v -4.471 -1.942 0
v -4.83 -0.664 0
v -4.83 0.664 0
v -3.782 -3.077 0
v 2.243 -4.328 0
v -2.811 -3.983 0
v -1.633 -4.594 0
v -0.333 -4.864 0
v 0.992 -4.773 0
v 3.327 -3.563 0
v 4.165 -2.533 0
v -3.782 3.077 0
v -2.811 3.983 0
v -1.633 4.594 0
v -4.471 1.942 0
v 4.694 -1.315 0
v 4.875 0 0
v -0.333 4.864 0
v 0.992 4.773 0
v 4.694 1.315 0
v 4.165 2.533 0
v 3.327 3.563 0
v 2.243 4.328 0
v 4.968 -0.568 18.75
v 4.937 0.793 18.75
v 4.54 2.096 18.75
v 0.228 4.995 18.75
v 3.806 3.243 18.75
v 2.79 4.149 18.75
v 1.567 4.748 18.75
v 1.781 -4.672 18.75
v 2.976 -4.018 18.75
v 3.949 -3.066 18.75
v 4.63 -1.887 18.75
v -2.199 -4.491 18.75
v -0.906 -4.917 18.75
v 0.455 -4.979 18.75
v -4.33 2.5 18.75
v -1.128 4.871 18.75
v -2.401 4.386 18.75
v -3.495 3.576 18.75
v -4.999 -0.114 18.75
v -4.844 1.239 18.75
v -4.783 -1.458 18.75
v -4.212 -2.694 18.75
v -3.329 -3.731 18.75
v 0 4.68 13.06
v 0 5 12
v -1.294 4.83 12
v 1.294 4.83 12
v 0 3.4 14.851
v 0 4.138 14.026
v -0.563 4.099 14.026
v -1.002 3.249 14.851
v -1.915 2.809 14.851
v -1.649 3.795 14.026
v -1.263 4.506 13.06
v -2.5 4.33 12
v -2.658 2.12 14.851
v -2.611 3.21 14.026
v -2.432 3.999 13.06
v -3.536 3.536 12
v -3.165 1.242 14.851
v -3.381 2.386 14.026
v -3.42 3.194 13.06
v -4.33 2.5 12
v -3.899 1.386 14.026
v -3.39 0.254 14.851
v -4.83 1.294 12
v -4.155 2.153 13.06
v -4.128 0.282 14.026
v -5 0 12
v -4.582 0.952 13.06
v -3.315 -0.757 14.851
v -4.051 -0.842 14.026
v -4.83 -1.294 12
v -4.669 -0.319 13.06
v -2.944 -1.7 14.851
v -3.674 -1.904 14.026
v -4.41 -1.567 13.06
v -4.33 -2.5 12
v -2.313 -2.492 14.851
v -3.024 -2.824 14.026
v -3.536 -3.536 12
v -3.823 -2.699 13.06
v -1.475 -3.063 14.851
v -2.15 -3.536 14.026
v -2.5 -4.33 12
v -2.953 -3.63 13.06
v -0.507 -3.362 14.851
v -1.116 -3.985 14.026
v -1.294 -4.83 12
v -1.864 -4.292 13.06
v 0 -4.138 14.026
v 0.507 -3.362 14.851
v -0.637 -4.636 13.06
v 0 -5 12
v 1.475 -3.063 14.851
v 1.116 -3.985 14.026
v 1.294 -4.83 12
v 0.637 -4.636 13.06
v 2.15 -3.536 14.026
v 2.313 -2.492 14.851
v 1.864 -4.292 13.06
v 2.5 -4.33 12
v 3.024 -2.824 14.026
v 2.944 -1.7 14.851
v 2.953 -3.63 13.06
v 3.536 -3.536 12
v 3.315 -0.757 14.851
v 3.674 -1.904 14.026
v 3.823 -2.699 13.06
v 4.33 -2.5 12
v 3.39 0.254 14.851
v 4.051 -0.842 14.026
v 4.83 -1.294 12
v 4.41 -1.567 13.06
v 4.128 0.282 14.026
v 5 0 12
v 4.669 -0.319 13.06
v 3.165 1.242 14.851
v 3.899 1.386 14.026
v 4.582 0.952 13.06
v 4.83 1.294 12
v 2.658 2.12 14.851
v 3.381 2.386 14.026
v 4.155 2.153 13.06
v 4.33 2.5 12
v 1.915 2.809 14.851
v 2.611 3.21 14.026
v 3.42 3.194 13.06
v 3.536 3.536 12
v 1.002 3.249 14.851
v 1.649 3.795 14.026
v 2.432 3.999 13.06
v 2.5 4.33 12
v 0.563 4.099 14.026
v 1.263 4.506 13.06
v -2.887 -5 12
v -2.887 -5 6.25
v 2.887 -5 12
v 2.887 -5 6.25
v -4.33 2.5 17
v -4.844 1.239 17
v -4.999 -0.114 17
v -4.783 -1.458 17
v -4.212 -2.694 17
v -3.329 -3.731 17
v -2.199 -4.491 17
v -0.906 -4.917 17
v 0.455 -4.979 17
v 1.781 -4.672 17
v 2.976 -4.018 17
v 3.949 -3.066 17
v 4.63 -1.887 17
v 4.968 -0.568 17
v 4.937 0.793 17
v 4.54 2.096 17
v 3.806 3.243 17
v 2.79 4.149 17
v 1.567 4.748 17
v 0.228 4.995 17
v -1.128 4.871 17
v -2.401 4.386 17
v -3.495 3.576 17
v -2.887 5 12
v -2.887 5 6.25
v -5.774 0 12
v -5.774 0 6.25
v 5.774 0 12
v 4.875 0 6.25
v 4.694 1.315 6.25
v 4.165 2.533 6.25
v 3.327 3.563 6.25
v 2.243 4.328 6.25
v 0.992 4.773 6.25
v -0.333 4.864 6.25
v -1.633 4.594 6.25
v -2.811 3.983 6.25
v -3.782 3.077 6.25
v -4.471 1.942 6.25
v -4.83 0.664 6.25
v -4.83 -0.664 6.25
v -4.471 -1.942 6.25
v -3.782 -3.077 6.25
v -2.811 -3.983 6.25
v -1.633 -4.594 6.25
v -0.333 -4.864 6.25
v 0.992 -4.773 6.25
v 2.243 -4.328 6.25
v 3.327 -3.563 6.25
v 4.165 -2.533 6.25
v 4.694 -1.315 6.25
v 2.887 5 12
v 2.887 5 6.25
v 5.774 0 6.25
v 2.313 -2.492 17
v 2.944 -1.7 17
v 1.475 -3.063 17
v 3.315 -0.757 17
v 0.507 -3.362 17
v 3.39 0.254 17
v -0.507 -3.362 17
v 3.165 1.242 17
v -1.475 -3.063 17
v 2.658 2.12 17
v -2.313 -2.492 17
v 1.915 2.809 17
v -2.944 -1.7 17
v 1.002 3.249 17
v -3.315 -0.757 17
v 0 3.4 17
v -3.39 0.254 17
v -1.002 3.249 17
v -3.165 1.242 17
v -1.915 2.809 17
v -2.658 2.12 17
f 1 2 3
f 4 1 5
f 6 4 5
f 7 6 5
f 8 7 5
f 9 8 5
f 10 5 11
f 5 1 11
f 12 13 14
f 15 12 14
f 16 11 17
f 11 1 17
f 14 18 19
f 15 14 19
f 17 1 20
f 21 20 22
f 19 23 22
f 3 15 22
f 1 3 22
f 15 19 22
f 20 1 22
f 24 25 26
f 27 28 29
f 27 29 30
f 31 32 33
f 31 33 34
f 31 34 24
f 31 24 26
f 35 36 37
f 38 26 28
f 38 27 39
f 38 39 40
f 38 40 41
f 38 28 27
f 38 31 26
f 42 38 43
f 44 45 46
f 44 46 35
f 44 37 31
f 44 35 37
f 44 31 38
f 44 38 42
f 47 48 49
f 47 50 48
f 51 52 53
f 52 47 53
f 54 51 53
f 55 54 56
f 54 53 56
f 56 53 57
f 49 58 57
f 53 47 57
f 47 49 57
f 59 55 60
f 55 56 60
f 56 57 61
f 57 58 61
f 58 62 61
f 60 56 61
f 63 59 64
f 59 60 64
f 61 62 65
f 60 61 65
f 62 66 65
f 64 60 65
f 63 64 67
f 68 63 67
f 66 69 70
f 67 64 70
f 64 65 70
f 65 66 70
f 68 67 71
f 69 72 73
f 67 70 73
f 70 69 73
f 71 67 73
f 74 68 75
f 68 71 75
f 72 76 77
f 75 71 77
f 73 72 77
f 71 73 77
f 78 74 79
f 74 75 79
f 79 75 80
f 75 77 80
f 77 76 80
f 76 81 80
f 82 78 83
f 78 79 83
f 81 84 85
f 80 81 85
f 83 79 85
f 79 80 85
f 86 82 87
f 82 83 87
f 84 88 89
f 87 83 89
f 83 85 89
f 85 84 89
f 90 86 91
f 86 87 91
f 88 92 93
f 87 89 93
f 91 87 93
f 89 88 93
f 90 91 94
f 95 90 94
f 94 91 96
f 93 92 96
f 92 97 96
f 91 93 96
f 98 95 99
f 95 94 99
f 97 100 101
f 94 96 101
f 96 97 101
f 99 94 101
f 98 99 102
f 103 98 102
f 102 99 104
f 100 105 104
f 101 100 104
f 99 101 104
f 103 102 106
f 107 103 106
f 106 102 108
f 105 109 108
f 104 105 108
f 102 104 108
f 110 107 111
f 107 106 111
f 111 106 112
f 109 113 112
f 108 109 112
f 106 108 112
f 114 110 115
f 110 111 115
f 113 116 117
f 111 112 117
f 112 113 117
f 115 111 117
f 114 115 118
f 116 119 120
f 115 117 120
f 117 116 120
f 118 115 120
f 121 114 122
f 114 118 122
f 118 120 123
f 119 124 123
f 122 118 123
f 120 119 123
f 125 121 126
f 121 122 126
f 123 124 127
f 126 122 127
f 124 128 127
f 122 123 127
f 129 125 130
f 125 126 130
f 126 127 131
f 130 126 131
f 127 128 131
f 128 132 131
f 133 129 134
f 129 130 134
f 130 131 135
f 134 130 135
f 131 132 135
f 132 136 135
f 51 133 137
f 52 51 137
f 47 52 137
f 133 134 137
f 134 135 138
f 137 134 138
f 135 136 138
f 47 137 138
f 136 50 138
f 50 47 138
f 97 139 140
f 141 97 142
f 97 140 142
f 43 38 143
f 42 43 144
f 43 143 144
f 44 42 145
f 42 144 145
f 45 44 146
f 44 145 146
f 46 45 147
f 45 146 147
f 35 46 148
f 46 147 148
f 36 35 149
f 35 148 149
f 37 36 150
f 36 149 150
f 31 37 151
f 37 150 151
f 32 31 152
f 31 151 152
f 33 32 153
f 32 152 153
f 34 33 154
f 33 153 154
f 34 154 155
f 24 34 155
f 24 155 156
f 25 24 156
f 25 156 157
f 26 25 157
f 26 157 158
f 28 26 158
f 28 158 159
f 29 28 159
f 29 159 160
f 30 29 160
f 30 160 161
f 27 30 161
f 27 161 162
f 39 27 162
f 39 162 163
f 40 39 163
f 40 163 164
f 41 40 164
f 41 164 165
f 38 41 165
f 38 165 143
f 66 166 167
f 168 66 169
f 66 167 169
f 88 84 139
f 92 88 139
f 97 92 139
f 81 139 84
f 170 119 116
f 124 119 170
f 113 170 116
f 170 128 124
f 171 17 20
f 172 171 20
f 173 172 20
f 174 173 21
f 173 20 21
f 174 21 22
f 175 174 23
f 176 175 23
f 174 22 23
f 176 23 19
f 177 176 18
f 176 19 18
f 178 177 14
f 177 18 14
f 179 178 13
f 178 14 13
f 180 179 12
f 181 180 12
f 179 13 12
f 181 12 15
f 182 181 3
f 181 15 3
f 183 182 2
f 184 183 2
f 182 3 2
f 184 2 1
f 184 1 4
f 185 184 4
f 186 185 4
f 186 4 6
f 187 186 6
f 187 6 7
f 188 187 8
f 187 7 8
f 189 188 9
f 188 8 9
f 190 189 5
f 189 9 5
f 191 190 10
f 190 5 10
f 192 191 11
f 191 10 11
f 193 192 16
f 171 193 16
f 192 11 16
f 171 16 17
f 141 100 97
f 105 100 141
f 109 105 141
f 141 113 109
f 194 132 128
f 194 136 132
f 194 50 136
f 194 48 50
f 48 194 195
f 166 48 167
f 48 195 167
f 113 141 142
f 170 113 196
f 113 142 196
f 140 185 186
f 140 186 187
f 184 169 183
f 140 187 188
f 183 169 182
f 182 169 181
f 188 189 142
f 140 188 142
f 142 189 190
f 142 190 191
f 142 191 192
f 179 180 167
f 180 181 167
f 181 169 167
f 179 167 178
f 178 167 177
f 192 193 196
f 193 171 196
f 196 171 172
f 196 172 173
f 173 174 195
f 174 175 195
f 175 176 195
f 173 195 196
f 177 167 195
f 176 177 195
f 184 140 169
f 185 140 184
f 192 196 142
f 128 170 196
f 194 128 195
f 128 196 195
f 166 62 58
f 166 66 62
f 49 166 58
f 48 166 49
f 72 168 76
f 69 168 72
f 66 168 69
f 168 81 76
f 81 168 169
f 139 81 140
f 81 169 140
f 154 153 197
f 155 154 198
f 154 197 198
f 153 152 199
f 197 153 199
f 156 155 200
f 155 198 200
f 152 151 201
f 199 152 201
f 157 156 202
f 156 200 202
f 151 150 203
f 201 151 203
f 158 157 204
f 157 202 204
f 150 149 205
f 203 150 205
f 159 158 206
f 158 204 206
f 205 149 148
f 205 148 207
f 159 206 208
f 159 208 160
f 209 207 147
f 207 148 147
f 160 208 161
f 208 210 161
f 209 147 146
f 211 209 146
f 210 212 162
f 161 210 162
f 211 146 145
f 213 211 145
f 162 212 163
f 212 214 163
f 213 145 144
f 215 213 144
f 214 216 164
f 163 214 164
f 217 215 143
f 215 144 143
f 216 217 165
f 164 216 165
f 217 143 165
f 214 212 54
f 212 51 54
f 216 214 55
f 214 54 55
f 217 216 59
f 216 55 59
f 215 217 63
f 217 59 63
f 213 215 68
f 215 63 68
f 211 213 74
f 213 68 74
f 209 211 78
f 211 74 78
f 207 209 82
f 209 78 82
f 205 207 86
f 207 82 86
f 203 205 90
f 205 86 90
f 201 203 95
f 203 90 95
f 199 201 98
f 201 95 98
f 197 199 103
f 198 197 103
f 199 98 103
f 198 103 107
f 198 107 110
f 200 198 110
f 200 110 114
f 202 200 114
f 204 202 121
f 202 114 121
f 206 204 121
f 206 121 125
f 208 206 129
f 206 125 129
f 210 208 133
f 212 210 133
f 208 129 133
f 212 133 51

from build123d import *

# Parameters (mm, degrees)
SKETCH1_R           = 4.875
BOSS_EXTRUDE1_DEPTH = 6.25
BOSS_EXTRUDE2_DEPTH = 5.75
SKETCH3_R           = 5
BOSS_EXTRUDE3_DEPTH = 6.75


with BuildPart() as part:
    # Sketch1 → Boss-Extrude1 (new body)
    with BuildSketch(Plane.XY):
        Circle(SKETCH1_R)
    extrude(amount=BOSS_EXTRUDE1_DEPTH)

    # Sketch2 → Boss-Extrude2 (add)
    with BuildSketch(Plane.XY.offset(6.25)):
        Polygon((5.773502692, 0), (2.886751346, 5), (-2.886751346, 5), (-5.773502692, 0), (-2.886751346, -5), (2.886751346, -5), align=None)
    extrude(amount=BOSS_EXTRUDE2_DEPTH)

    # Sketch3 → Boss-Extrude3 (add)
    with BuildSketch(Plane.XY.offset(12)):
        with Locations(Location((0, 0, 0), (0, 0, 150))):
            Circle(SKETCH3_R)
    extrude(amount=BOSS_EXTRUDE3_DEPTH)

    # Sketch4 → Cut-Revolve1 (revolve, cut)
    with BuildSketch(Plane(origin=(0, 0, 0), x_dir=(0, 0, -1), z_dir=(1, 0, 0))):
        with BuildLine():
            Line((-17, 5), (-17, 3.4))
            Line((-17, 3.4), (-14.850952939, 3.4))
            ThreePointArc((-14.850952939, 3.4), (-13.557536702, 4.435310943), (-12, 5))
            Line((-12, 5), (-17, 5))
        make_face()
    revolve(axis=Axis((0, 0, 12), (0, 0, 1)), mode=Mode.SUBTRACT)


solid = part.part
